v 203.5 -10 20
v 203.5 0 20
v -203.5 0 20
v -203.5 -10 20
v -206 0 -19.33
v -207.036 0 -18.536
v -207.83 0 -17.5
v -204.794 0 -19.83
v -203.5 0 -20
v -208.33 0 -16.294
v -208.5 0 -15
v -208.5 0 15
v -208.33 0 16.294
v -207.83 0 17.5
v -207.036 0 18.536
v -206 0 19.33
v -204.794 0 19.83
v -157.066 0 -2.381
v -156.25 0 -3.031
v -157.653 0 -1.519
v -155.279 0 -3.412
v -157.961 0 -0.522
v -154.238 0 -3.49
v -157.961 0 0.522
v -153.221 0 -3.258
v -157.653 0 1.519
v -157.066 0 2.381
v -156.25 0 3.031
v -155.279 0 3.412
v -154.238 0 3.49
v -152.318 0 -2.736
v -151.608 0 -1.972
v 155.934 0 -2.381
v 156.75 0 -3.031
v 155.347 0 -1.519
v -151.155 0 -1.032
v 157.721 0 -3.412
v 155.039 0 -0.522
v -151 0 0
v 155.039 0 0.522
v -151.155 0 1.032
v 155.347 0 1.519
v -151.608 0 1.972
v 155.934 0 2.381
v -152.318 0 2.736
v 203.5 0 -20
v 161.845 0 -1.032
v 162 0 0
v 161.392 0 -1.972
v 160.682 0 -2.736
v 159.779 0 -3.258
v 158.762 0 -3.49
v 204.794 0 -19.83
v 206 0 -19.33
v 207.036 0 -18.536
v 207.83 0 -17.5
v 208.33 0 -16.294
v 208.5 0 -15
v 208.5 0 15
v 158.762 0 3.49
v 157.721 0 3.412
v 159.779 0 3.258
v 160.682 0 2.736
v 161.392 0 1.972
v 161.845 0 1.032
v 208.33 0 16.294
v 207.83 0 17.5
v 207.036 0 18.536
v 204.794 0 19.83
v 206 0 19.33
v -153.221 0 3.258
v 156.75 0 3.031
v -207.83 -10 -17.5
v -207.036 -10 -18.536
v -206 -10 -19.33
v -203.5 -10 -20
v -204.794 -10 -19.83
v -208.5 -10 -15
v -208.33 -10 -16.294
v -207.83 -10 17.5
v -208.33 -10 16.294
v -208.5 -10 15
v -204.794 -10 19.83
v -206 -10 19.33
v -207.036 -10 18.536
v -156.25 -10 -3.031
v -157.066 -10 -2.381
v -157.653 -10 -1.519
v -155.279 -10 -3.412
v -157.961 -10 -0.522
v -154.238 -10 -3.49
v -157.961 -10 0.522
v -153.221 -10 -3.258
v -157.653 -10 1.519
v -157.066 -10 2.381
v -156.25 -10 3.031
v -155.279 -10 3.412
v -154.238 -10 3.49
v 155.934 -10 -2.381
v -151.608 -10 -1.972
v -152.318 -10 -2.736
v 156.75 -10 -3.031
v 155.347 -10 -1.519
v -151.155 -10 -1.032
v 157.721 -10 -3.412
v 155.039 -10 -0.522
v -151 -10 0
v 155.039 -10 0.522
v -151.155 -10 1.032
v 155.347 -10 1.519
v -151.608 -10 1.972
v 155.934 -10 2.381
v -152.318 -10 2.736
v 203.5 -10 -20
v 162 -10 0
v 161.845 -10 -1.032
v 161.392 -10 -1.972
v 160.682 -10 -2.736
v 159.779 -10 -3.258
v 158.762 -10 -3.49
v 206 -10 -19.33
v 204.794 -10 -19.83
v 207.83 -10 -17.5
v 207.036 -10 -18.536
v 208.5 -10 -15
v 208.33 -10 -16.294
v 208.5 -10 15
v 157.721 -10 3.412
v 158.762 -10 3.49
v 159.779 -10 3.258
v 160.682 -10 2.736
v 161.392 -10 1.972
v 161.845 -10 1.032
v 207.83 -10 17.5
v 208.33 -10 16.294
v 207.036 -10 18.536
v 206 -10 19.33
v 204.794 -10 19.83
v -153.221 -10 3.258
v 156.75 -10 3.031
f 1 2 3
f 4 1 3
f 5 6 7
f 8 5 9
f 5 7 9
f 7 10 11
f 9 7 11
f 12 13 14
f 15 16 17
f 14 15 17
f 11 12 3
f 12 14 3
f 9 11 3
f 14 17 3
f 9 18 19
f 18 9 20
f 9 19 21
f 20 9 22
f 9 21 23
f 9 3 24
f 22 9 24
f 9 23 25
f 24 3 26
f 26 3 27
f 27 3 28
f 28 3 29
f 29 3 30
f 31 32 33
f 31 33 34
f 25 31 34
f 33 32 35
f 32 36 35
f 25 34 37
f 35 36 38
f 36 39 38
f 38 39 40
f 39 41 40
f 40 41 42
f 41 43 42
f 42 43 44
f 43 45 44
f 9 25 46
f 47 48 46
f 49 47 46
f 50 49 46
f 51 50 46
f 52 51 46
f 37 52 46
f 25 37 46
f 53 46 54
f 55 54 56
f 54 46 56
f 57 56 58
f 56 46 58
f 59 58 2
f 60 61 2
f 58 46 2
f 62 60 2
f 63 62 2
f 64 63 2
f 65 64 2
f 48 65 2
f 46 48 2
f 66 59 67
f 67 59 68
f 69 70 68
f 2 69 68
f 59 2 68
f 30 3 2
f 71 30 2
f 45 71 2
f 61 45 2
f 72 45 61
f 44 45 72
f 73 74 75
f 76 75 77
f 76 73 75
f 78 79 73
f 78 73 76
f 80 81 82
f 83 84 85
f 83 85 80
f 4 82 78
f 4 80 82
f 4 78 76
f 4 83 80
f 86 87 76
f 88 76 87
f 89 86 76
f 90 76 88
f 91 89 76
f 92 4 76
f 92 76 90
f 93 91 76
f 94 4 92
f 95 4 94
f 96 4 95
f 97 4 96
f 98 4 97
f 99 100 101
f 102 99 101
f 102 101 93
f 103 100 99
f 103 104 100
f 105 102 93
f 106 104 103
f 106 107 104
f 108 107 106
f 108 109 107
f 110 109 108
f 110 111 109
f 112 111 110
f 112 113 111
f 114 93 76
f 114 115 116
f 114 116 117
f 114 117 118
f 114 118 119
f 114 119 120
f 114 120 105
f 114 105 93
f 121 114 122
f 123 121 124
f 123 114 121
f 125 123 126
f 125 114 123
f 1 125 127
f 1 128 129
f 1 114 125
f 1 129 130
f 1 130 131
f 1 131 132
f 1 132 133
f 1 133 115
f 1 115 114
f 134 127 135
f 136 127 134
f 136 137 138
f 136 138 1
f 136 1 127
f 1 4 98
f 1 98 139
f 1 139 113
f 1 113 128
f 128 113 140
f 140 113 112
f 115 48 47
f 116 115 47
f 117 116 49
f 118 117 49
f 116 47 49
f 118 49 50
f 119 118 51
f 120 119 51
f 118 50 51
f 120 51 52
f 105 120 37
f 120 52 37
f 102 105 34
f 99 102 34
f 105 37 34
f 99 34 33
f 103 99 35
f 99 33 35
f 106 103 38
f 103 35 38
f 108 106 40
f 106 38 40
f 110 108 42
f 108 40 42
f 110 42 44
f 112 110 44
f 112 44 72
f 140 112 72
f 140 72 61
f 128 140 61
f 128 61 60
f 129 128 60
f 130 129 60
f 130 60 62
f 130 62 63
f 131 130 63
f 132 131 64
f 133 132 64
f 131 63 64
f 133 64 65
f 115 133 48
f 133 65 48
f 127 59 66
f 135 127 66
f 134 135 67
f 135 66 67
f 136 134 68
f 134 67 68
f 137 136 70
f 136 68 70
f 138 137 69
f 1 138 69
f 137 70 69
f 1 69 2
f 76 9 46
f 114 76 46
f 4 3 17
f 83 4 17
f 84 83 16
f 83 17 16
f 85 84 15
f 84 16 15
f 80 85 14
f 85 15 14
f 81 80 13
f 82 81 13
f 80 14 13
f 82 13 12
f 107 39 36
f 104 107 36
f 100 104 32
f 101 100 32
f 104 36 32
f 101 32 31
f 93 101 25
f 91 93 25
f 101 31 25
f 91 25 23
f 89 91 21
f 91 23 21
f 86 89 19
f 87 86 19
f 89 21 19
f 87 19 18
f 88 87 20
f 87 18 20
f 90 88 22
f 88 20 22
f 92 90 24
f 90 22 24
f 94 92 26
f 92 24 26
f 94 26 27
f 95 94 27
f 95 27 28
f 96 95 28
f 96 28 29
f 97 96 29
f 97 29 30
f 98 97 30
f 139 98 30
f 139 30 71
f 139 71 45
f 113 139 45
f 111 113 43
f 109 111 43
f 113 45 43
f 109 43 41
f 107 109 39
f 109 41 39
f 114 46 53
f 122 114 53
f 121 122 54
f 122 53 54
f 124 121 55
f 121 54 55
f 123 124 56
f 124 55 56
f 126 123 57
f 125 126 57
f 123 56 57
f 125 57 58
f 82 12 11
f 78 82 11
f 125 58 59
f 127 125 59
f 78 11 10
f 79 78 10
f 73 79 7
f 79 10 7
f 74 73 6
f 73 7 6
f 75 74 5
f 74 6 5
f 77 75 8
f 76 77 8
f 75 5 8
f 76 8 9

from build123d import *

# Parameters (mm, degrees)
F0_W     = 10
F0_H     = 20
F1_DEPTH = 10


with BuildPart() as f1:
    # F0 (on Front) → F1 (new body)
    with BuildSketch(Plane.XZ):
        with BuildLine():
            Line((-80.5, 20), (-203.5, 20))
            ThreePointArc((-203.5, 20), (-207.035534, 18.535534), (-208.5, 15))
            Line((-208.5, 15), (-208.5, 0))
            Line((-208.5, 0), (-158, 0))
            ThreePointArc((-158, 0), (-154.5, 3.5), (-151, 0))
            Line((-151, 0), (-80.5, 0))
            Line((-80.5, 0), (-80.5, 20))
        make_face()
        with Locations((-75.5, 10)):
            Rectangle(F0_W, F0_H)
        with BuildLine():
            Line((198.5, 20), (-70.5, 20))
            Line((-70.5, 20), (-70.5, 0))
            Line((-70.5, 0), (155, 0))
            ThreePointArc((155, 0), (158.5, 3.5), (162, 0))
            Line((162, 0), (198.5, 0))
            Line((198.5, 0), (198.5, 20))
        make_face()
        with BuildLine():
            Line((-80.5, -20), (-80.5, 0))
            Line((-80.5, 0), (-151, 0))
            ThreePointArc((-151, 0), (-154.5, -3.5), (-158, 0))
            Line((-158, 0), (-208.5, 0))
            Line((-208.5, 0), (-208.5, -15))
            ThreePointArc((-208.5, -15), (-207.035534, -18.535534), (-203.5, -20))
            Line((-203.5, -20), (-80.5, -20))
        make_face()
        with Locations((-75.5, -10)):
            Rectangle(F0_W, F0_H)
        with BuildLine():
            Line((203.5, 20), (198.5, 20))
            Line((198.5, 20), (198.5, 0))
            Line((198.5, 0), (208.5, 0))
            Line((208.5, 0), (208.5, 15))
            ThreePointArc((208.5, 15), (207.035534, 18.535534), (203.5, 20))
        make_face()
        with BuildLine():
            Line((155, 0), (-70.5, 0))
            Line((-70.5, 0), (-70.5, -20))
            Line((-70.5, -20), (198.5, -20))
            Line((198.5, -20), (198.5, 0))
            Line((198.5, 0), (162, 0))
            ThreePointArc((162, 0), (158.5, -3.5), (155, 0))
        make_face()
        with BuildLine():
            Line((208.5, 0), (198.5, 0))
            Line((198.5, 0), (198.5, -20))
            Line((198.5, -20), (203.5, -20))
            ThreePointArc((203.5, -20), (207.035534, -18.535534), (208.5, -15))
            Line((208.5, -15), (208.5, 0))
        make_face()
    extrude(amount=F1_DEPTH)


solid = f1.part
